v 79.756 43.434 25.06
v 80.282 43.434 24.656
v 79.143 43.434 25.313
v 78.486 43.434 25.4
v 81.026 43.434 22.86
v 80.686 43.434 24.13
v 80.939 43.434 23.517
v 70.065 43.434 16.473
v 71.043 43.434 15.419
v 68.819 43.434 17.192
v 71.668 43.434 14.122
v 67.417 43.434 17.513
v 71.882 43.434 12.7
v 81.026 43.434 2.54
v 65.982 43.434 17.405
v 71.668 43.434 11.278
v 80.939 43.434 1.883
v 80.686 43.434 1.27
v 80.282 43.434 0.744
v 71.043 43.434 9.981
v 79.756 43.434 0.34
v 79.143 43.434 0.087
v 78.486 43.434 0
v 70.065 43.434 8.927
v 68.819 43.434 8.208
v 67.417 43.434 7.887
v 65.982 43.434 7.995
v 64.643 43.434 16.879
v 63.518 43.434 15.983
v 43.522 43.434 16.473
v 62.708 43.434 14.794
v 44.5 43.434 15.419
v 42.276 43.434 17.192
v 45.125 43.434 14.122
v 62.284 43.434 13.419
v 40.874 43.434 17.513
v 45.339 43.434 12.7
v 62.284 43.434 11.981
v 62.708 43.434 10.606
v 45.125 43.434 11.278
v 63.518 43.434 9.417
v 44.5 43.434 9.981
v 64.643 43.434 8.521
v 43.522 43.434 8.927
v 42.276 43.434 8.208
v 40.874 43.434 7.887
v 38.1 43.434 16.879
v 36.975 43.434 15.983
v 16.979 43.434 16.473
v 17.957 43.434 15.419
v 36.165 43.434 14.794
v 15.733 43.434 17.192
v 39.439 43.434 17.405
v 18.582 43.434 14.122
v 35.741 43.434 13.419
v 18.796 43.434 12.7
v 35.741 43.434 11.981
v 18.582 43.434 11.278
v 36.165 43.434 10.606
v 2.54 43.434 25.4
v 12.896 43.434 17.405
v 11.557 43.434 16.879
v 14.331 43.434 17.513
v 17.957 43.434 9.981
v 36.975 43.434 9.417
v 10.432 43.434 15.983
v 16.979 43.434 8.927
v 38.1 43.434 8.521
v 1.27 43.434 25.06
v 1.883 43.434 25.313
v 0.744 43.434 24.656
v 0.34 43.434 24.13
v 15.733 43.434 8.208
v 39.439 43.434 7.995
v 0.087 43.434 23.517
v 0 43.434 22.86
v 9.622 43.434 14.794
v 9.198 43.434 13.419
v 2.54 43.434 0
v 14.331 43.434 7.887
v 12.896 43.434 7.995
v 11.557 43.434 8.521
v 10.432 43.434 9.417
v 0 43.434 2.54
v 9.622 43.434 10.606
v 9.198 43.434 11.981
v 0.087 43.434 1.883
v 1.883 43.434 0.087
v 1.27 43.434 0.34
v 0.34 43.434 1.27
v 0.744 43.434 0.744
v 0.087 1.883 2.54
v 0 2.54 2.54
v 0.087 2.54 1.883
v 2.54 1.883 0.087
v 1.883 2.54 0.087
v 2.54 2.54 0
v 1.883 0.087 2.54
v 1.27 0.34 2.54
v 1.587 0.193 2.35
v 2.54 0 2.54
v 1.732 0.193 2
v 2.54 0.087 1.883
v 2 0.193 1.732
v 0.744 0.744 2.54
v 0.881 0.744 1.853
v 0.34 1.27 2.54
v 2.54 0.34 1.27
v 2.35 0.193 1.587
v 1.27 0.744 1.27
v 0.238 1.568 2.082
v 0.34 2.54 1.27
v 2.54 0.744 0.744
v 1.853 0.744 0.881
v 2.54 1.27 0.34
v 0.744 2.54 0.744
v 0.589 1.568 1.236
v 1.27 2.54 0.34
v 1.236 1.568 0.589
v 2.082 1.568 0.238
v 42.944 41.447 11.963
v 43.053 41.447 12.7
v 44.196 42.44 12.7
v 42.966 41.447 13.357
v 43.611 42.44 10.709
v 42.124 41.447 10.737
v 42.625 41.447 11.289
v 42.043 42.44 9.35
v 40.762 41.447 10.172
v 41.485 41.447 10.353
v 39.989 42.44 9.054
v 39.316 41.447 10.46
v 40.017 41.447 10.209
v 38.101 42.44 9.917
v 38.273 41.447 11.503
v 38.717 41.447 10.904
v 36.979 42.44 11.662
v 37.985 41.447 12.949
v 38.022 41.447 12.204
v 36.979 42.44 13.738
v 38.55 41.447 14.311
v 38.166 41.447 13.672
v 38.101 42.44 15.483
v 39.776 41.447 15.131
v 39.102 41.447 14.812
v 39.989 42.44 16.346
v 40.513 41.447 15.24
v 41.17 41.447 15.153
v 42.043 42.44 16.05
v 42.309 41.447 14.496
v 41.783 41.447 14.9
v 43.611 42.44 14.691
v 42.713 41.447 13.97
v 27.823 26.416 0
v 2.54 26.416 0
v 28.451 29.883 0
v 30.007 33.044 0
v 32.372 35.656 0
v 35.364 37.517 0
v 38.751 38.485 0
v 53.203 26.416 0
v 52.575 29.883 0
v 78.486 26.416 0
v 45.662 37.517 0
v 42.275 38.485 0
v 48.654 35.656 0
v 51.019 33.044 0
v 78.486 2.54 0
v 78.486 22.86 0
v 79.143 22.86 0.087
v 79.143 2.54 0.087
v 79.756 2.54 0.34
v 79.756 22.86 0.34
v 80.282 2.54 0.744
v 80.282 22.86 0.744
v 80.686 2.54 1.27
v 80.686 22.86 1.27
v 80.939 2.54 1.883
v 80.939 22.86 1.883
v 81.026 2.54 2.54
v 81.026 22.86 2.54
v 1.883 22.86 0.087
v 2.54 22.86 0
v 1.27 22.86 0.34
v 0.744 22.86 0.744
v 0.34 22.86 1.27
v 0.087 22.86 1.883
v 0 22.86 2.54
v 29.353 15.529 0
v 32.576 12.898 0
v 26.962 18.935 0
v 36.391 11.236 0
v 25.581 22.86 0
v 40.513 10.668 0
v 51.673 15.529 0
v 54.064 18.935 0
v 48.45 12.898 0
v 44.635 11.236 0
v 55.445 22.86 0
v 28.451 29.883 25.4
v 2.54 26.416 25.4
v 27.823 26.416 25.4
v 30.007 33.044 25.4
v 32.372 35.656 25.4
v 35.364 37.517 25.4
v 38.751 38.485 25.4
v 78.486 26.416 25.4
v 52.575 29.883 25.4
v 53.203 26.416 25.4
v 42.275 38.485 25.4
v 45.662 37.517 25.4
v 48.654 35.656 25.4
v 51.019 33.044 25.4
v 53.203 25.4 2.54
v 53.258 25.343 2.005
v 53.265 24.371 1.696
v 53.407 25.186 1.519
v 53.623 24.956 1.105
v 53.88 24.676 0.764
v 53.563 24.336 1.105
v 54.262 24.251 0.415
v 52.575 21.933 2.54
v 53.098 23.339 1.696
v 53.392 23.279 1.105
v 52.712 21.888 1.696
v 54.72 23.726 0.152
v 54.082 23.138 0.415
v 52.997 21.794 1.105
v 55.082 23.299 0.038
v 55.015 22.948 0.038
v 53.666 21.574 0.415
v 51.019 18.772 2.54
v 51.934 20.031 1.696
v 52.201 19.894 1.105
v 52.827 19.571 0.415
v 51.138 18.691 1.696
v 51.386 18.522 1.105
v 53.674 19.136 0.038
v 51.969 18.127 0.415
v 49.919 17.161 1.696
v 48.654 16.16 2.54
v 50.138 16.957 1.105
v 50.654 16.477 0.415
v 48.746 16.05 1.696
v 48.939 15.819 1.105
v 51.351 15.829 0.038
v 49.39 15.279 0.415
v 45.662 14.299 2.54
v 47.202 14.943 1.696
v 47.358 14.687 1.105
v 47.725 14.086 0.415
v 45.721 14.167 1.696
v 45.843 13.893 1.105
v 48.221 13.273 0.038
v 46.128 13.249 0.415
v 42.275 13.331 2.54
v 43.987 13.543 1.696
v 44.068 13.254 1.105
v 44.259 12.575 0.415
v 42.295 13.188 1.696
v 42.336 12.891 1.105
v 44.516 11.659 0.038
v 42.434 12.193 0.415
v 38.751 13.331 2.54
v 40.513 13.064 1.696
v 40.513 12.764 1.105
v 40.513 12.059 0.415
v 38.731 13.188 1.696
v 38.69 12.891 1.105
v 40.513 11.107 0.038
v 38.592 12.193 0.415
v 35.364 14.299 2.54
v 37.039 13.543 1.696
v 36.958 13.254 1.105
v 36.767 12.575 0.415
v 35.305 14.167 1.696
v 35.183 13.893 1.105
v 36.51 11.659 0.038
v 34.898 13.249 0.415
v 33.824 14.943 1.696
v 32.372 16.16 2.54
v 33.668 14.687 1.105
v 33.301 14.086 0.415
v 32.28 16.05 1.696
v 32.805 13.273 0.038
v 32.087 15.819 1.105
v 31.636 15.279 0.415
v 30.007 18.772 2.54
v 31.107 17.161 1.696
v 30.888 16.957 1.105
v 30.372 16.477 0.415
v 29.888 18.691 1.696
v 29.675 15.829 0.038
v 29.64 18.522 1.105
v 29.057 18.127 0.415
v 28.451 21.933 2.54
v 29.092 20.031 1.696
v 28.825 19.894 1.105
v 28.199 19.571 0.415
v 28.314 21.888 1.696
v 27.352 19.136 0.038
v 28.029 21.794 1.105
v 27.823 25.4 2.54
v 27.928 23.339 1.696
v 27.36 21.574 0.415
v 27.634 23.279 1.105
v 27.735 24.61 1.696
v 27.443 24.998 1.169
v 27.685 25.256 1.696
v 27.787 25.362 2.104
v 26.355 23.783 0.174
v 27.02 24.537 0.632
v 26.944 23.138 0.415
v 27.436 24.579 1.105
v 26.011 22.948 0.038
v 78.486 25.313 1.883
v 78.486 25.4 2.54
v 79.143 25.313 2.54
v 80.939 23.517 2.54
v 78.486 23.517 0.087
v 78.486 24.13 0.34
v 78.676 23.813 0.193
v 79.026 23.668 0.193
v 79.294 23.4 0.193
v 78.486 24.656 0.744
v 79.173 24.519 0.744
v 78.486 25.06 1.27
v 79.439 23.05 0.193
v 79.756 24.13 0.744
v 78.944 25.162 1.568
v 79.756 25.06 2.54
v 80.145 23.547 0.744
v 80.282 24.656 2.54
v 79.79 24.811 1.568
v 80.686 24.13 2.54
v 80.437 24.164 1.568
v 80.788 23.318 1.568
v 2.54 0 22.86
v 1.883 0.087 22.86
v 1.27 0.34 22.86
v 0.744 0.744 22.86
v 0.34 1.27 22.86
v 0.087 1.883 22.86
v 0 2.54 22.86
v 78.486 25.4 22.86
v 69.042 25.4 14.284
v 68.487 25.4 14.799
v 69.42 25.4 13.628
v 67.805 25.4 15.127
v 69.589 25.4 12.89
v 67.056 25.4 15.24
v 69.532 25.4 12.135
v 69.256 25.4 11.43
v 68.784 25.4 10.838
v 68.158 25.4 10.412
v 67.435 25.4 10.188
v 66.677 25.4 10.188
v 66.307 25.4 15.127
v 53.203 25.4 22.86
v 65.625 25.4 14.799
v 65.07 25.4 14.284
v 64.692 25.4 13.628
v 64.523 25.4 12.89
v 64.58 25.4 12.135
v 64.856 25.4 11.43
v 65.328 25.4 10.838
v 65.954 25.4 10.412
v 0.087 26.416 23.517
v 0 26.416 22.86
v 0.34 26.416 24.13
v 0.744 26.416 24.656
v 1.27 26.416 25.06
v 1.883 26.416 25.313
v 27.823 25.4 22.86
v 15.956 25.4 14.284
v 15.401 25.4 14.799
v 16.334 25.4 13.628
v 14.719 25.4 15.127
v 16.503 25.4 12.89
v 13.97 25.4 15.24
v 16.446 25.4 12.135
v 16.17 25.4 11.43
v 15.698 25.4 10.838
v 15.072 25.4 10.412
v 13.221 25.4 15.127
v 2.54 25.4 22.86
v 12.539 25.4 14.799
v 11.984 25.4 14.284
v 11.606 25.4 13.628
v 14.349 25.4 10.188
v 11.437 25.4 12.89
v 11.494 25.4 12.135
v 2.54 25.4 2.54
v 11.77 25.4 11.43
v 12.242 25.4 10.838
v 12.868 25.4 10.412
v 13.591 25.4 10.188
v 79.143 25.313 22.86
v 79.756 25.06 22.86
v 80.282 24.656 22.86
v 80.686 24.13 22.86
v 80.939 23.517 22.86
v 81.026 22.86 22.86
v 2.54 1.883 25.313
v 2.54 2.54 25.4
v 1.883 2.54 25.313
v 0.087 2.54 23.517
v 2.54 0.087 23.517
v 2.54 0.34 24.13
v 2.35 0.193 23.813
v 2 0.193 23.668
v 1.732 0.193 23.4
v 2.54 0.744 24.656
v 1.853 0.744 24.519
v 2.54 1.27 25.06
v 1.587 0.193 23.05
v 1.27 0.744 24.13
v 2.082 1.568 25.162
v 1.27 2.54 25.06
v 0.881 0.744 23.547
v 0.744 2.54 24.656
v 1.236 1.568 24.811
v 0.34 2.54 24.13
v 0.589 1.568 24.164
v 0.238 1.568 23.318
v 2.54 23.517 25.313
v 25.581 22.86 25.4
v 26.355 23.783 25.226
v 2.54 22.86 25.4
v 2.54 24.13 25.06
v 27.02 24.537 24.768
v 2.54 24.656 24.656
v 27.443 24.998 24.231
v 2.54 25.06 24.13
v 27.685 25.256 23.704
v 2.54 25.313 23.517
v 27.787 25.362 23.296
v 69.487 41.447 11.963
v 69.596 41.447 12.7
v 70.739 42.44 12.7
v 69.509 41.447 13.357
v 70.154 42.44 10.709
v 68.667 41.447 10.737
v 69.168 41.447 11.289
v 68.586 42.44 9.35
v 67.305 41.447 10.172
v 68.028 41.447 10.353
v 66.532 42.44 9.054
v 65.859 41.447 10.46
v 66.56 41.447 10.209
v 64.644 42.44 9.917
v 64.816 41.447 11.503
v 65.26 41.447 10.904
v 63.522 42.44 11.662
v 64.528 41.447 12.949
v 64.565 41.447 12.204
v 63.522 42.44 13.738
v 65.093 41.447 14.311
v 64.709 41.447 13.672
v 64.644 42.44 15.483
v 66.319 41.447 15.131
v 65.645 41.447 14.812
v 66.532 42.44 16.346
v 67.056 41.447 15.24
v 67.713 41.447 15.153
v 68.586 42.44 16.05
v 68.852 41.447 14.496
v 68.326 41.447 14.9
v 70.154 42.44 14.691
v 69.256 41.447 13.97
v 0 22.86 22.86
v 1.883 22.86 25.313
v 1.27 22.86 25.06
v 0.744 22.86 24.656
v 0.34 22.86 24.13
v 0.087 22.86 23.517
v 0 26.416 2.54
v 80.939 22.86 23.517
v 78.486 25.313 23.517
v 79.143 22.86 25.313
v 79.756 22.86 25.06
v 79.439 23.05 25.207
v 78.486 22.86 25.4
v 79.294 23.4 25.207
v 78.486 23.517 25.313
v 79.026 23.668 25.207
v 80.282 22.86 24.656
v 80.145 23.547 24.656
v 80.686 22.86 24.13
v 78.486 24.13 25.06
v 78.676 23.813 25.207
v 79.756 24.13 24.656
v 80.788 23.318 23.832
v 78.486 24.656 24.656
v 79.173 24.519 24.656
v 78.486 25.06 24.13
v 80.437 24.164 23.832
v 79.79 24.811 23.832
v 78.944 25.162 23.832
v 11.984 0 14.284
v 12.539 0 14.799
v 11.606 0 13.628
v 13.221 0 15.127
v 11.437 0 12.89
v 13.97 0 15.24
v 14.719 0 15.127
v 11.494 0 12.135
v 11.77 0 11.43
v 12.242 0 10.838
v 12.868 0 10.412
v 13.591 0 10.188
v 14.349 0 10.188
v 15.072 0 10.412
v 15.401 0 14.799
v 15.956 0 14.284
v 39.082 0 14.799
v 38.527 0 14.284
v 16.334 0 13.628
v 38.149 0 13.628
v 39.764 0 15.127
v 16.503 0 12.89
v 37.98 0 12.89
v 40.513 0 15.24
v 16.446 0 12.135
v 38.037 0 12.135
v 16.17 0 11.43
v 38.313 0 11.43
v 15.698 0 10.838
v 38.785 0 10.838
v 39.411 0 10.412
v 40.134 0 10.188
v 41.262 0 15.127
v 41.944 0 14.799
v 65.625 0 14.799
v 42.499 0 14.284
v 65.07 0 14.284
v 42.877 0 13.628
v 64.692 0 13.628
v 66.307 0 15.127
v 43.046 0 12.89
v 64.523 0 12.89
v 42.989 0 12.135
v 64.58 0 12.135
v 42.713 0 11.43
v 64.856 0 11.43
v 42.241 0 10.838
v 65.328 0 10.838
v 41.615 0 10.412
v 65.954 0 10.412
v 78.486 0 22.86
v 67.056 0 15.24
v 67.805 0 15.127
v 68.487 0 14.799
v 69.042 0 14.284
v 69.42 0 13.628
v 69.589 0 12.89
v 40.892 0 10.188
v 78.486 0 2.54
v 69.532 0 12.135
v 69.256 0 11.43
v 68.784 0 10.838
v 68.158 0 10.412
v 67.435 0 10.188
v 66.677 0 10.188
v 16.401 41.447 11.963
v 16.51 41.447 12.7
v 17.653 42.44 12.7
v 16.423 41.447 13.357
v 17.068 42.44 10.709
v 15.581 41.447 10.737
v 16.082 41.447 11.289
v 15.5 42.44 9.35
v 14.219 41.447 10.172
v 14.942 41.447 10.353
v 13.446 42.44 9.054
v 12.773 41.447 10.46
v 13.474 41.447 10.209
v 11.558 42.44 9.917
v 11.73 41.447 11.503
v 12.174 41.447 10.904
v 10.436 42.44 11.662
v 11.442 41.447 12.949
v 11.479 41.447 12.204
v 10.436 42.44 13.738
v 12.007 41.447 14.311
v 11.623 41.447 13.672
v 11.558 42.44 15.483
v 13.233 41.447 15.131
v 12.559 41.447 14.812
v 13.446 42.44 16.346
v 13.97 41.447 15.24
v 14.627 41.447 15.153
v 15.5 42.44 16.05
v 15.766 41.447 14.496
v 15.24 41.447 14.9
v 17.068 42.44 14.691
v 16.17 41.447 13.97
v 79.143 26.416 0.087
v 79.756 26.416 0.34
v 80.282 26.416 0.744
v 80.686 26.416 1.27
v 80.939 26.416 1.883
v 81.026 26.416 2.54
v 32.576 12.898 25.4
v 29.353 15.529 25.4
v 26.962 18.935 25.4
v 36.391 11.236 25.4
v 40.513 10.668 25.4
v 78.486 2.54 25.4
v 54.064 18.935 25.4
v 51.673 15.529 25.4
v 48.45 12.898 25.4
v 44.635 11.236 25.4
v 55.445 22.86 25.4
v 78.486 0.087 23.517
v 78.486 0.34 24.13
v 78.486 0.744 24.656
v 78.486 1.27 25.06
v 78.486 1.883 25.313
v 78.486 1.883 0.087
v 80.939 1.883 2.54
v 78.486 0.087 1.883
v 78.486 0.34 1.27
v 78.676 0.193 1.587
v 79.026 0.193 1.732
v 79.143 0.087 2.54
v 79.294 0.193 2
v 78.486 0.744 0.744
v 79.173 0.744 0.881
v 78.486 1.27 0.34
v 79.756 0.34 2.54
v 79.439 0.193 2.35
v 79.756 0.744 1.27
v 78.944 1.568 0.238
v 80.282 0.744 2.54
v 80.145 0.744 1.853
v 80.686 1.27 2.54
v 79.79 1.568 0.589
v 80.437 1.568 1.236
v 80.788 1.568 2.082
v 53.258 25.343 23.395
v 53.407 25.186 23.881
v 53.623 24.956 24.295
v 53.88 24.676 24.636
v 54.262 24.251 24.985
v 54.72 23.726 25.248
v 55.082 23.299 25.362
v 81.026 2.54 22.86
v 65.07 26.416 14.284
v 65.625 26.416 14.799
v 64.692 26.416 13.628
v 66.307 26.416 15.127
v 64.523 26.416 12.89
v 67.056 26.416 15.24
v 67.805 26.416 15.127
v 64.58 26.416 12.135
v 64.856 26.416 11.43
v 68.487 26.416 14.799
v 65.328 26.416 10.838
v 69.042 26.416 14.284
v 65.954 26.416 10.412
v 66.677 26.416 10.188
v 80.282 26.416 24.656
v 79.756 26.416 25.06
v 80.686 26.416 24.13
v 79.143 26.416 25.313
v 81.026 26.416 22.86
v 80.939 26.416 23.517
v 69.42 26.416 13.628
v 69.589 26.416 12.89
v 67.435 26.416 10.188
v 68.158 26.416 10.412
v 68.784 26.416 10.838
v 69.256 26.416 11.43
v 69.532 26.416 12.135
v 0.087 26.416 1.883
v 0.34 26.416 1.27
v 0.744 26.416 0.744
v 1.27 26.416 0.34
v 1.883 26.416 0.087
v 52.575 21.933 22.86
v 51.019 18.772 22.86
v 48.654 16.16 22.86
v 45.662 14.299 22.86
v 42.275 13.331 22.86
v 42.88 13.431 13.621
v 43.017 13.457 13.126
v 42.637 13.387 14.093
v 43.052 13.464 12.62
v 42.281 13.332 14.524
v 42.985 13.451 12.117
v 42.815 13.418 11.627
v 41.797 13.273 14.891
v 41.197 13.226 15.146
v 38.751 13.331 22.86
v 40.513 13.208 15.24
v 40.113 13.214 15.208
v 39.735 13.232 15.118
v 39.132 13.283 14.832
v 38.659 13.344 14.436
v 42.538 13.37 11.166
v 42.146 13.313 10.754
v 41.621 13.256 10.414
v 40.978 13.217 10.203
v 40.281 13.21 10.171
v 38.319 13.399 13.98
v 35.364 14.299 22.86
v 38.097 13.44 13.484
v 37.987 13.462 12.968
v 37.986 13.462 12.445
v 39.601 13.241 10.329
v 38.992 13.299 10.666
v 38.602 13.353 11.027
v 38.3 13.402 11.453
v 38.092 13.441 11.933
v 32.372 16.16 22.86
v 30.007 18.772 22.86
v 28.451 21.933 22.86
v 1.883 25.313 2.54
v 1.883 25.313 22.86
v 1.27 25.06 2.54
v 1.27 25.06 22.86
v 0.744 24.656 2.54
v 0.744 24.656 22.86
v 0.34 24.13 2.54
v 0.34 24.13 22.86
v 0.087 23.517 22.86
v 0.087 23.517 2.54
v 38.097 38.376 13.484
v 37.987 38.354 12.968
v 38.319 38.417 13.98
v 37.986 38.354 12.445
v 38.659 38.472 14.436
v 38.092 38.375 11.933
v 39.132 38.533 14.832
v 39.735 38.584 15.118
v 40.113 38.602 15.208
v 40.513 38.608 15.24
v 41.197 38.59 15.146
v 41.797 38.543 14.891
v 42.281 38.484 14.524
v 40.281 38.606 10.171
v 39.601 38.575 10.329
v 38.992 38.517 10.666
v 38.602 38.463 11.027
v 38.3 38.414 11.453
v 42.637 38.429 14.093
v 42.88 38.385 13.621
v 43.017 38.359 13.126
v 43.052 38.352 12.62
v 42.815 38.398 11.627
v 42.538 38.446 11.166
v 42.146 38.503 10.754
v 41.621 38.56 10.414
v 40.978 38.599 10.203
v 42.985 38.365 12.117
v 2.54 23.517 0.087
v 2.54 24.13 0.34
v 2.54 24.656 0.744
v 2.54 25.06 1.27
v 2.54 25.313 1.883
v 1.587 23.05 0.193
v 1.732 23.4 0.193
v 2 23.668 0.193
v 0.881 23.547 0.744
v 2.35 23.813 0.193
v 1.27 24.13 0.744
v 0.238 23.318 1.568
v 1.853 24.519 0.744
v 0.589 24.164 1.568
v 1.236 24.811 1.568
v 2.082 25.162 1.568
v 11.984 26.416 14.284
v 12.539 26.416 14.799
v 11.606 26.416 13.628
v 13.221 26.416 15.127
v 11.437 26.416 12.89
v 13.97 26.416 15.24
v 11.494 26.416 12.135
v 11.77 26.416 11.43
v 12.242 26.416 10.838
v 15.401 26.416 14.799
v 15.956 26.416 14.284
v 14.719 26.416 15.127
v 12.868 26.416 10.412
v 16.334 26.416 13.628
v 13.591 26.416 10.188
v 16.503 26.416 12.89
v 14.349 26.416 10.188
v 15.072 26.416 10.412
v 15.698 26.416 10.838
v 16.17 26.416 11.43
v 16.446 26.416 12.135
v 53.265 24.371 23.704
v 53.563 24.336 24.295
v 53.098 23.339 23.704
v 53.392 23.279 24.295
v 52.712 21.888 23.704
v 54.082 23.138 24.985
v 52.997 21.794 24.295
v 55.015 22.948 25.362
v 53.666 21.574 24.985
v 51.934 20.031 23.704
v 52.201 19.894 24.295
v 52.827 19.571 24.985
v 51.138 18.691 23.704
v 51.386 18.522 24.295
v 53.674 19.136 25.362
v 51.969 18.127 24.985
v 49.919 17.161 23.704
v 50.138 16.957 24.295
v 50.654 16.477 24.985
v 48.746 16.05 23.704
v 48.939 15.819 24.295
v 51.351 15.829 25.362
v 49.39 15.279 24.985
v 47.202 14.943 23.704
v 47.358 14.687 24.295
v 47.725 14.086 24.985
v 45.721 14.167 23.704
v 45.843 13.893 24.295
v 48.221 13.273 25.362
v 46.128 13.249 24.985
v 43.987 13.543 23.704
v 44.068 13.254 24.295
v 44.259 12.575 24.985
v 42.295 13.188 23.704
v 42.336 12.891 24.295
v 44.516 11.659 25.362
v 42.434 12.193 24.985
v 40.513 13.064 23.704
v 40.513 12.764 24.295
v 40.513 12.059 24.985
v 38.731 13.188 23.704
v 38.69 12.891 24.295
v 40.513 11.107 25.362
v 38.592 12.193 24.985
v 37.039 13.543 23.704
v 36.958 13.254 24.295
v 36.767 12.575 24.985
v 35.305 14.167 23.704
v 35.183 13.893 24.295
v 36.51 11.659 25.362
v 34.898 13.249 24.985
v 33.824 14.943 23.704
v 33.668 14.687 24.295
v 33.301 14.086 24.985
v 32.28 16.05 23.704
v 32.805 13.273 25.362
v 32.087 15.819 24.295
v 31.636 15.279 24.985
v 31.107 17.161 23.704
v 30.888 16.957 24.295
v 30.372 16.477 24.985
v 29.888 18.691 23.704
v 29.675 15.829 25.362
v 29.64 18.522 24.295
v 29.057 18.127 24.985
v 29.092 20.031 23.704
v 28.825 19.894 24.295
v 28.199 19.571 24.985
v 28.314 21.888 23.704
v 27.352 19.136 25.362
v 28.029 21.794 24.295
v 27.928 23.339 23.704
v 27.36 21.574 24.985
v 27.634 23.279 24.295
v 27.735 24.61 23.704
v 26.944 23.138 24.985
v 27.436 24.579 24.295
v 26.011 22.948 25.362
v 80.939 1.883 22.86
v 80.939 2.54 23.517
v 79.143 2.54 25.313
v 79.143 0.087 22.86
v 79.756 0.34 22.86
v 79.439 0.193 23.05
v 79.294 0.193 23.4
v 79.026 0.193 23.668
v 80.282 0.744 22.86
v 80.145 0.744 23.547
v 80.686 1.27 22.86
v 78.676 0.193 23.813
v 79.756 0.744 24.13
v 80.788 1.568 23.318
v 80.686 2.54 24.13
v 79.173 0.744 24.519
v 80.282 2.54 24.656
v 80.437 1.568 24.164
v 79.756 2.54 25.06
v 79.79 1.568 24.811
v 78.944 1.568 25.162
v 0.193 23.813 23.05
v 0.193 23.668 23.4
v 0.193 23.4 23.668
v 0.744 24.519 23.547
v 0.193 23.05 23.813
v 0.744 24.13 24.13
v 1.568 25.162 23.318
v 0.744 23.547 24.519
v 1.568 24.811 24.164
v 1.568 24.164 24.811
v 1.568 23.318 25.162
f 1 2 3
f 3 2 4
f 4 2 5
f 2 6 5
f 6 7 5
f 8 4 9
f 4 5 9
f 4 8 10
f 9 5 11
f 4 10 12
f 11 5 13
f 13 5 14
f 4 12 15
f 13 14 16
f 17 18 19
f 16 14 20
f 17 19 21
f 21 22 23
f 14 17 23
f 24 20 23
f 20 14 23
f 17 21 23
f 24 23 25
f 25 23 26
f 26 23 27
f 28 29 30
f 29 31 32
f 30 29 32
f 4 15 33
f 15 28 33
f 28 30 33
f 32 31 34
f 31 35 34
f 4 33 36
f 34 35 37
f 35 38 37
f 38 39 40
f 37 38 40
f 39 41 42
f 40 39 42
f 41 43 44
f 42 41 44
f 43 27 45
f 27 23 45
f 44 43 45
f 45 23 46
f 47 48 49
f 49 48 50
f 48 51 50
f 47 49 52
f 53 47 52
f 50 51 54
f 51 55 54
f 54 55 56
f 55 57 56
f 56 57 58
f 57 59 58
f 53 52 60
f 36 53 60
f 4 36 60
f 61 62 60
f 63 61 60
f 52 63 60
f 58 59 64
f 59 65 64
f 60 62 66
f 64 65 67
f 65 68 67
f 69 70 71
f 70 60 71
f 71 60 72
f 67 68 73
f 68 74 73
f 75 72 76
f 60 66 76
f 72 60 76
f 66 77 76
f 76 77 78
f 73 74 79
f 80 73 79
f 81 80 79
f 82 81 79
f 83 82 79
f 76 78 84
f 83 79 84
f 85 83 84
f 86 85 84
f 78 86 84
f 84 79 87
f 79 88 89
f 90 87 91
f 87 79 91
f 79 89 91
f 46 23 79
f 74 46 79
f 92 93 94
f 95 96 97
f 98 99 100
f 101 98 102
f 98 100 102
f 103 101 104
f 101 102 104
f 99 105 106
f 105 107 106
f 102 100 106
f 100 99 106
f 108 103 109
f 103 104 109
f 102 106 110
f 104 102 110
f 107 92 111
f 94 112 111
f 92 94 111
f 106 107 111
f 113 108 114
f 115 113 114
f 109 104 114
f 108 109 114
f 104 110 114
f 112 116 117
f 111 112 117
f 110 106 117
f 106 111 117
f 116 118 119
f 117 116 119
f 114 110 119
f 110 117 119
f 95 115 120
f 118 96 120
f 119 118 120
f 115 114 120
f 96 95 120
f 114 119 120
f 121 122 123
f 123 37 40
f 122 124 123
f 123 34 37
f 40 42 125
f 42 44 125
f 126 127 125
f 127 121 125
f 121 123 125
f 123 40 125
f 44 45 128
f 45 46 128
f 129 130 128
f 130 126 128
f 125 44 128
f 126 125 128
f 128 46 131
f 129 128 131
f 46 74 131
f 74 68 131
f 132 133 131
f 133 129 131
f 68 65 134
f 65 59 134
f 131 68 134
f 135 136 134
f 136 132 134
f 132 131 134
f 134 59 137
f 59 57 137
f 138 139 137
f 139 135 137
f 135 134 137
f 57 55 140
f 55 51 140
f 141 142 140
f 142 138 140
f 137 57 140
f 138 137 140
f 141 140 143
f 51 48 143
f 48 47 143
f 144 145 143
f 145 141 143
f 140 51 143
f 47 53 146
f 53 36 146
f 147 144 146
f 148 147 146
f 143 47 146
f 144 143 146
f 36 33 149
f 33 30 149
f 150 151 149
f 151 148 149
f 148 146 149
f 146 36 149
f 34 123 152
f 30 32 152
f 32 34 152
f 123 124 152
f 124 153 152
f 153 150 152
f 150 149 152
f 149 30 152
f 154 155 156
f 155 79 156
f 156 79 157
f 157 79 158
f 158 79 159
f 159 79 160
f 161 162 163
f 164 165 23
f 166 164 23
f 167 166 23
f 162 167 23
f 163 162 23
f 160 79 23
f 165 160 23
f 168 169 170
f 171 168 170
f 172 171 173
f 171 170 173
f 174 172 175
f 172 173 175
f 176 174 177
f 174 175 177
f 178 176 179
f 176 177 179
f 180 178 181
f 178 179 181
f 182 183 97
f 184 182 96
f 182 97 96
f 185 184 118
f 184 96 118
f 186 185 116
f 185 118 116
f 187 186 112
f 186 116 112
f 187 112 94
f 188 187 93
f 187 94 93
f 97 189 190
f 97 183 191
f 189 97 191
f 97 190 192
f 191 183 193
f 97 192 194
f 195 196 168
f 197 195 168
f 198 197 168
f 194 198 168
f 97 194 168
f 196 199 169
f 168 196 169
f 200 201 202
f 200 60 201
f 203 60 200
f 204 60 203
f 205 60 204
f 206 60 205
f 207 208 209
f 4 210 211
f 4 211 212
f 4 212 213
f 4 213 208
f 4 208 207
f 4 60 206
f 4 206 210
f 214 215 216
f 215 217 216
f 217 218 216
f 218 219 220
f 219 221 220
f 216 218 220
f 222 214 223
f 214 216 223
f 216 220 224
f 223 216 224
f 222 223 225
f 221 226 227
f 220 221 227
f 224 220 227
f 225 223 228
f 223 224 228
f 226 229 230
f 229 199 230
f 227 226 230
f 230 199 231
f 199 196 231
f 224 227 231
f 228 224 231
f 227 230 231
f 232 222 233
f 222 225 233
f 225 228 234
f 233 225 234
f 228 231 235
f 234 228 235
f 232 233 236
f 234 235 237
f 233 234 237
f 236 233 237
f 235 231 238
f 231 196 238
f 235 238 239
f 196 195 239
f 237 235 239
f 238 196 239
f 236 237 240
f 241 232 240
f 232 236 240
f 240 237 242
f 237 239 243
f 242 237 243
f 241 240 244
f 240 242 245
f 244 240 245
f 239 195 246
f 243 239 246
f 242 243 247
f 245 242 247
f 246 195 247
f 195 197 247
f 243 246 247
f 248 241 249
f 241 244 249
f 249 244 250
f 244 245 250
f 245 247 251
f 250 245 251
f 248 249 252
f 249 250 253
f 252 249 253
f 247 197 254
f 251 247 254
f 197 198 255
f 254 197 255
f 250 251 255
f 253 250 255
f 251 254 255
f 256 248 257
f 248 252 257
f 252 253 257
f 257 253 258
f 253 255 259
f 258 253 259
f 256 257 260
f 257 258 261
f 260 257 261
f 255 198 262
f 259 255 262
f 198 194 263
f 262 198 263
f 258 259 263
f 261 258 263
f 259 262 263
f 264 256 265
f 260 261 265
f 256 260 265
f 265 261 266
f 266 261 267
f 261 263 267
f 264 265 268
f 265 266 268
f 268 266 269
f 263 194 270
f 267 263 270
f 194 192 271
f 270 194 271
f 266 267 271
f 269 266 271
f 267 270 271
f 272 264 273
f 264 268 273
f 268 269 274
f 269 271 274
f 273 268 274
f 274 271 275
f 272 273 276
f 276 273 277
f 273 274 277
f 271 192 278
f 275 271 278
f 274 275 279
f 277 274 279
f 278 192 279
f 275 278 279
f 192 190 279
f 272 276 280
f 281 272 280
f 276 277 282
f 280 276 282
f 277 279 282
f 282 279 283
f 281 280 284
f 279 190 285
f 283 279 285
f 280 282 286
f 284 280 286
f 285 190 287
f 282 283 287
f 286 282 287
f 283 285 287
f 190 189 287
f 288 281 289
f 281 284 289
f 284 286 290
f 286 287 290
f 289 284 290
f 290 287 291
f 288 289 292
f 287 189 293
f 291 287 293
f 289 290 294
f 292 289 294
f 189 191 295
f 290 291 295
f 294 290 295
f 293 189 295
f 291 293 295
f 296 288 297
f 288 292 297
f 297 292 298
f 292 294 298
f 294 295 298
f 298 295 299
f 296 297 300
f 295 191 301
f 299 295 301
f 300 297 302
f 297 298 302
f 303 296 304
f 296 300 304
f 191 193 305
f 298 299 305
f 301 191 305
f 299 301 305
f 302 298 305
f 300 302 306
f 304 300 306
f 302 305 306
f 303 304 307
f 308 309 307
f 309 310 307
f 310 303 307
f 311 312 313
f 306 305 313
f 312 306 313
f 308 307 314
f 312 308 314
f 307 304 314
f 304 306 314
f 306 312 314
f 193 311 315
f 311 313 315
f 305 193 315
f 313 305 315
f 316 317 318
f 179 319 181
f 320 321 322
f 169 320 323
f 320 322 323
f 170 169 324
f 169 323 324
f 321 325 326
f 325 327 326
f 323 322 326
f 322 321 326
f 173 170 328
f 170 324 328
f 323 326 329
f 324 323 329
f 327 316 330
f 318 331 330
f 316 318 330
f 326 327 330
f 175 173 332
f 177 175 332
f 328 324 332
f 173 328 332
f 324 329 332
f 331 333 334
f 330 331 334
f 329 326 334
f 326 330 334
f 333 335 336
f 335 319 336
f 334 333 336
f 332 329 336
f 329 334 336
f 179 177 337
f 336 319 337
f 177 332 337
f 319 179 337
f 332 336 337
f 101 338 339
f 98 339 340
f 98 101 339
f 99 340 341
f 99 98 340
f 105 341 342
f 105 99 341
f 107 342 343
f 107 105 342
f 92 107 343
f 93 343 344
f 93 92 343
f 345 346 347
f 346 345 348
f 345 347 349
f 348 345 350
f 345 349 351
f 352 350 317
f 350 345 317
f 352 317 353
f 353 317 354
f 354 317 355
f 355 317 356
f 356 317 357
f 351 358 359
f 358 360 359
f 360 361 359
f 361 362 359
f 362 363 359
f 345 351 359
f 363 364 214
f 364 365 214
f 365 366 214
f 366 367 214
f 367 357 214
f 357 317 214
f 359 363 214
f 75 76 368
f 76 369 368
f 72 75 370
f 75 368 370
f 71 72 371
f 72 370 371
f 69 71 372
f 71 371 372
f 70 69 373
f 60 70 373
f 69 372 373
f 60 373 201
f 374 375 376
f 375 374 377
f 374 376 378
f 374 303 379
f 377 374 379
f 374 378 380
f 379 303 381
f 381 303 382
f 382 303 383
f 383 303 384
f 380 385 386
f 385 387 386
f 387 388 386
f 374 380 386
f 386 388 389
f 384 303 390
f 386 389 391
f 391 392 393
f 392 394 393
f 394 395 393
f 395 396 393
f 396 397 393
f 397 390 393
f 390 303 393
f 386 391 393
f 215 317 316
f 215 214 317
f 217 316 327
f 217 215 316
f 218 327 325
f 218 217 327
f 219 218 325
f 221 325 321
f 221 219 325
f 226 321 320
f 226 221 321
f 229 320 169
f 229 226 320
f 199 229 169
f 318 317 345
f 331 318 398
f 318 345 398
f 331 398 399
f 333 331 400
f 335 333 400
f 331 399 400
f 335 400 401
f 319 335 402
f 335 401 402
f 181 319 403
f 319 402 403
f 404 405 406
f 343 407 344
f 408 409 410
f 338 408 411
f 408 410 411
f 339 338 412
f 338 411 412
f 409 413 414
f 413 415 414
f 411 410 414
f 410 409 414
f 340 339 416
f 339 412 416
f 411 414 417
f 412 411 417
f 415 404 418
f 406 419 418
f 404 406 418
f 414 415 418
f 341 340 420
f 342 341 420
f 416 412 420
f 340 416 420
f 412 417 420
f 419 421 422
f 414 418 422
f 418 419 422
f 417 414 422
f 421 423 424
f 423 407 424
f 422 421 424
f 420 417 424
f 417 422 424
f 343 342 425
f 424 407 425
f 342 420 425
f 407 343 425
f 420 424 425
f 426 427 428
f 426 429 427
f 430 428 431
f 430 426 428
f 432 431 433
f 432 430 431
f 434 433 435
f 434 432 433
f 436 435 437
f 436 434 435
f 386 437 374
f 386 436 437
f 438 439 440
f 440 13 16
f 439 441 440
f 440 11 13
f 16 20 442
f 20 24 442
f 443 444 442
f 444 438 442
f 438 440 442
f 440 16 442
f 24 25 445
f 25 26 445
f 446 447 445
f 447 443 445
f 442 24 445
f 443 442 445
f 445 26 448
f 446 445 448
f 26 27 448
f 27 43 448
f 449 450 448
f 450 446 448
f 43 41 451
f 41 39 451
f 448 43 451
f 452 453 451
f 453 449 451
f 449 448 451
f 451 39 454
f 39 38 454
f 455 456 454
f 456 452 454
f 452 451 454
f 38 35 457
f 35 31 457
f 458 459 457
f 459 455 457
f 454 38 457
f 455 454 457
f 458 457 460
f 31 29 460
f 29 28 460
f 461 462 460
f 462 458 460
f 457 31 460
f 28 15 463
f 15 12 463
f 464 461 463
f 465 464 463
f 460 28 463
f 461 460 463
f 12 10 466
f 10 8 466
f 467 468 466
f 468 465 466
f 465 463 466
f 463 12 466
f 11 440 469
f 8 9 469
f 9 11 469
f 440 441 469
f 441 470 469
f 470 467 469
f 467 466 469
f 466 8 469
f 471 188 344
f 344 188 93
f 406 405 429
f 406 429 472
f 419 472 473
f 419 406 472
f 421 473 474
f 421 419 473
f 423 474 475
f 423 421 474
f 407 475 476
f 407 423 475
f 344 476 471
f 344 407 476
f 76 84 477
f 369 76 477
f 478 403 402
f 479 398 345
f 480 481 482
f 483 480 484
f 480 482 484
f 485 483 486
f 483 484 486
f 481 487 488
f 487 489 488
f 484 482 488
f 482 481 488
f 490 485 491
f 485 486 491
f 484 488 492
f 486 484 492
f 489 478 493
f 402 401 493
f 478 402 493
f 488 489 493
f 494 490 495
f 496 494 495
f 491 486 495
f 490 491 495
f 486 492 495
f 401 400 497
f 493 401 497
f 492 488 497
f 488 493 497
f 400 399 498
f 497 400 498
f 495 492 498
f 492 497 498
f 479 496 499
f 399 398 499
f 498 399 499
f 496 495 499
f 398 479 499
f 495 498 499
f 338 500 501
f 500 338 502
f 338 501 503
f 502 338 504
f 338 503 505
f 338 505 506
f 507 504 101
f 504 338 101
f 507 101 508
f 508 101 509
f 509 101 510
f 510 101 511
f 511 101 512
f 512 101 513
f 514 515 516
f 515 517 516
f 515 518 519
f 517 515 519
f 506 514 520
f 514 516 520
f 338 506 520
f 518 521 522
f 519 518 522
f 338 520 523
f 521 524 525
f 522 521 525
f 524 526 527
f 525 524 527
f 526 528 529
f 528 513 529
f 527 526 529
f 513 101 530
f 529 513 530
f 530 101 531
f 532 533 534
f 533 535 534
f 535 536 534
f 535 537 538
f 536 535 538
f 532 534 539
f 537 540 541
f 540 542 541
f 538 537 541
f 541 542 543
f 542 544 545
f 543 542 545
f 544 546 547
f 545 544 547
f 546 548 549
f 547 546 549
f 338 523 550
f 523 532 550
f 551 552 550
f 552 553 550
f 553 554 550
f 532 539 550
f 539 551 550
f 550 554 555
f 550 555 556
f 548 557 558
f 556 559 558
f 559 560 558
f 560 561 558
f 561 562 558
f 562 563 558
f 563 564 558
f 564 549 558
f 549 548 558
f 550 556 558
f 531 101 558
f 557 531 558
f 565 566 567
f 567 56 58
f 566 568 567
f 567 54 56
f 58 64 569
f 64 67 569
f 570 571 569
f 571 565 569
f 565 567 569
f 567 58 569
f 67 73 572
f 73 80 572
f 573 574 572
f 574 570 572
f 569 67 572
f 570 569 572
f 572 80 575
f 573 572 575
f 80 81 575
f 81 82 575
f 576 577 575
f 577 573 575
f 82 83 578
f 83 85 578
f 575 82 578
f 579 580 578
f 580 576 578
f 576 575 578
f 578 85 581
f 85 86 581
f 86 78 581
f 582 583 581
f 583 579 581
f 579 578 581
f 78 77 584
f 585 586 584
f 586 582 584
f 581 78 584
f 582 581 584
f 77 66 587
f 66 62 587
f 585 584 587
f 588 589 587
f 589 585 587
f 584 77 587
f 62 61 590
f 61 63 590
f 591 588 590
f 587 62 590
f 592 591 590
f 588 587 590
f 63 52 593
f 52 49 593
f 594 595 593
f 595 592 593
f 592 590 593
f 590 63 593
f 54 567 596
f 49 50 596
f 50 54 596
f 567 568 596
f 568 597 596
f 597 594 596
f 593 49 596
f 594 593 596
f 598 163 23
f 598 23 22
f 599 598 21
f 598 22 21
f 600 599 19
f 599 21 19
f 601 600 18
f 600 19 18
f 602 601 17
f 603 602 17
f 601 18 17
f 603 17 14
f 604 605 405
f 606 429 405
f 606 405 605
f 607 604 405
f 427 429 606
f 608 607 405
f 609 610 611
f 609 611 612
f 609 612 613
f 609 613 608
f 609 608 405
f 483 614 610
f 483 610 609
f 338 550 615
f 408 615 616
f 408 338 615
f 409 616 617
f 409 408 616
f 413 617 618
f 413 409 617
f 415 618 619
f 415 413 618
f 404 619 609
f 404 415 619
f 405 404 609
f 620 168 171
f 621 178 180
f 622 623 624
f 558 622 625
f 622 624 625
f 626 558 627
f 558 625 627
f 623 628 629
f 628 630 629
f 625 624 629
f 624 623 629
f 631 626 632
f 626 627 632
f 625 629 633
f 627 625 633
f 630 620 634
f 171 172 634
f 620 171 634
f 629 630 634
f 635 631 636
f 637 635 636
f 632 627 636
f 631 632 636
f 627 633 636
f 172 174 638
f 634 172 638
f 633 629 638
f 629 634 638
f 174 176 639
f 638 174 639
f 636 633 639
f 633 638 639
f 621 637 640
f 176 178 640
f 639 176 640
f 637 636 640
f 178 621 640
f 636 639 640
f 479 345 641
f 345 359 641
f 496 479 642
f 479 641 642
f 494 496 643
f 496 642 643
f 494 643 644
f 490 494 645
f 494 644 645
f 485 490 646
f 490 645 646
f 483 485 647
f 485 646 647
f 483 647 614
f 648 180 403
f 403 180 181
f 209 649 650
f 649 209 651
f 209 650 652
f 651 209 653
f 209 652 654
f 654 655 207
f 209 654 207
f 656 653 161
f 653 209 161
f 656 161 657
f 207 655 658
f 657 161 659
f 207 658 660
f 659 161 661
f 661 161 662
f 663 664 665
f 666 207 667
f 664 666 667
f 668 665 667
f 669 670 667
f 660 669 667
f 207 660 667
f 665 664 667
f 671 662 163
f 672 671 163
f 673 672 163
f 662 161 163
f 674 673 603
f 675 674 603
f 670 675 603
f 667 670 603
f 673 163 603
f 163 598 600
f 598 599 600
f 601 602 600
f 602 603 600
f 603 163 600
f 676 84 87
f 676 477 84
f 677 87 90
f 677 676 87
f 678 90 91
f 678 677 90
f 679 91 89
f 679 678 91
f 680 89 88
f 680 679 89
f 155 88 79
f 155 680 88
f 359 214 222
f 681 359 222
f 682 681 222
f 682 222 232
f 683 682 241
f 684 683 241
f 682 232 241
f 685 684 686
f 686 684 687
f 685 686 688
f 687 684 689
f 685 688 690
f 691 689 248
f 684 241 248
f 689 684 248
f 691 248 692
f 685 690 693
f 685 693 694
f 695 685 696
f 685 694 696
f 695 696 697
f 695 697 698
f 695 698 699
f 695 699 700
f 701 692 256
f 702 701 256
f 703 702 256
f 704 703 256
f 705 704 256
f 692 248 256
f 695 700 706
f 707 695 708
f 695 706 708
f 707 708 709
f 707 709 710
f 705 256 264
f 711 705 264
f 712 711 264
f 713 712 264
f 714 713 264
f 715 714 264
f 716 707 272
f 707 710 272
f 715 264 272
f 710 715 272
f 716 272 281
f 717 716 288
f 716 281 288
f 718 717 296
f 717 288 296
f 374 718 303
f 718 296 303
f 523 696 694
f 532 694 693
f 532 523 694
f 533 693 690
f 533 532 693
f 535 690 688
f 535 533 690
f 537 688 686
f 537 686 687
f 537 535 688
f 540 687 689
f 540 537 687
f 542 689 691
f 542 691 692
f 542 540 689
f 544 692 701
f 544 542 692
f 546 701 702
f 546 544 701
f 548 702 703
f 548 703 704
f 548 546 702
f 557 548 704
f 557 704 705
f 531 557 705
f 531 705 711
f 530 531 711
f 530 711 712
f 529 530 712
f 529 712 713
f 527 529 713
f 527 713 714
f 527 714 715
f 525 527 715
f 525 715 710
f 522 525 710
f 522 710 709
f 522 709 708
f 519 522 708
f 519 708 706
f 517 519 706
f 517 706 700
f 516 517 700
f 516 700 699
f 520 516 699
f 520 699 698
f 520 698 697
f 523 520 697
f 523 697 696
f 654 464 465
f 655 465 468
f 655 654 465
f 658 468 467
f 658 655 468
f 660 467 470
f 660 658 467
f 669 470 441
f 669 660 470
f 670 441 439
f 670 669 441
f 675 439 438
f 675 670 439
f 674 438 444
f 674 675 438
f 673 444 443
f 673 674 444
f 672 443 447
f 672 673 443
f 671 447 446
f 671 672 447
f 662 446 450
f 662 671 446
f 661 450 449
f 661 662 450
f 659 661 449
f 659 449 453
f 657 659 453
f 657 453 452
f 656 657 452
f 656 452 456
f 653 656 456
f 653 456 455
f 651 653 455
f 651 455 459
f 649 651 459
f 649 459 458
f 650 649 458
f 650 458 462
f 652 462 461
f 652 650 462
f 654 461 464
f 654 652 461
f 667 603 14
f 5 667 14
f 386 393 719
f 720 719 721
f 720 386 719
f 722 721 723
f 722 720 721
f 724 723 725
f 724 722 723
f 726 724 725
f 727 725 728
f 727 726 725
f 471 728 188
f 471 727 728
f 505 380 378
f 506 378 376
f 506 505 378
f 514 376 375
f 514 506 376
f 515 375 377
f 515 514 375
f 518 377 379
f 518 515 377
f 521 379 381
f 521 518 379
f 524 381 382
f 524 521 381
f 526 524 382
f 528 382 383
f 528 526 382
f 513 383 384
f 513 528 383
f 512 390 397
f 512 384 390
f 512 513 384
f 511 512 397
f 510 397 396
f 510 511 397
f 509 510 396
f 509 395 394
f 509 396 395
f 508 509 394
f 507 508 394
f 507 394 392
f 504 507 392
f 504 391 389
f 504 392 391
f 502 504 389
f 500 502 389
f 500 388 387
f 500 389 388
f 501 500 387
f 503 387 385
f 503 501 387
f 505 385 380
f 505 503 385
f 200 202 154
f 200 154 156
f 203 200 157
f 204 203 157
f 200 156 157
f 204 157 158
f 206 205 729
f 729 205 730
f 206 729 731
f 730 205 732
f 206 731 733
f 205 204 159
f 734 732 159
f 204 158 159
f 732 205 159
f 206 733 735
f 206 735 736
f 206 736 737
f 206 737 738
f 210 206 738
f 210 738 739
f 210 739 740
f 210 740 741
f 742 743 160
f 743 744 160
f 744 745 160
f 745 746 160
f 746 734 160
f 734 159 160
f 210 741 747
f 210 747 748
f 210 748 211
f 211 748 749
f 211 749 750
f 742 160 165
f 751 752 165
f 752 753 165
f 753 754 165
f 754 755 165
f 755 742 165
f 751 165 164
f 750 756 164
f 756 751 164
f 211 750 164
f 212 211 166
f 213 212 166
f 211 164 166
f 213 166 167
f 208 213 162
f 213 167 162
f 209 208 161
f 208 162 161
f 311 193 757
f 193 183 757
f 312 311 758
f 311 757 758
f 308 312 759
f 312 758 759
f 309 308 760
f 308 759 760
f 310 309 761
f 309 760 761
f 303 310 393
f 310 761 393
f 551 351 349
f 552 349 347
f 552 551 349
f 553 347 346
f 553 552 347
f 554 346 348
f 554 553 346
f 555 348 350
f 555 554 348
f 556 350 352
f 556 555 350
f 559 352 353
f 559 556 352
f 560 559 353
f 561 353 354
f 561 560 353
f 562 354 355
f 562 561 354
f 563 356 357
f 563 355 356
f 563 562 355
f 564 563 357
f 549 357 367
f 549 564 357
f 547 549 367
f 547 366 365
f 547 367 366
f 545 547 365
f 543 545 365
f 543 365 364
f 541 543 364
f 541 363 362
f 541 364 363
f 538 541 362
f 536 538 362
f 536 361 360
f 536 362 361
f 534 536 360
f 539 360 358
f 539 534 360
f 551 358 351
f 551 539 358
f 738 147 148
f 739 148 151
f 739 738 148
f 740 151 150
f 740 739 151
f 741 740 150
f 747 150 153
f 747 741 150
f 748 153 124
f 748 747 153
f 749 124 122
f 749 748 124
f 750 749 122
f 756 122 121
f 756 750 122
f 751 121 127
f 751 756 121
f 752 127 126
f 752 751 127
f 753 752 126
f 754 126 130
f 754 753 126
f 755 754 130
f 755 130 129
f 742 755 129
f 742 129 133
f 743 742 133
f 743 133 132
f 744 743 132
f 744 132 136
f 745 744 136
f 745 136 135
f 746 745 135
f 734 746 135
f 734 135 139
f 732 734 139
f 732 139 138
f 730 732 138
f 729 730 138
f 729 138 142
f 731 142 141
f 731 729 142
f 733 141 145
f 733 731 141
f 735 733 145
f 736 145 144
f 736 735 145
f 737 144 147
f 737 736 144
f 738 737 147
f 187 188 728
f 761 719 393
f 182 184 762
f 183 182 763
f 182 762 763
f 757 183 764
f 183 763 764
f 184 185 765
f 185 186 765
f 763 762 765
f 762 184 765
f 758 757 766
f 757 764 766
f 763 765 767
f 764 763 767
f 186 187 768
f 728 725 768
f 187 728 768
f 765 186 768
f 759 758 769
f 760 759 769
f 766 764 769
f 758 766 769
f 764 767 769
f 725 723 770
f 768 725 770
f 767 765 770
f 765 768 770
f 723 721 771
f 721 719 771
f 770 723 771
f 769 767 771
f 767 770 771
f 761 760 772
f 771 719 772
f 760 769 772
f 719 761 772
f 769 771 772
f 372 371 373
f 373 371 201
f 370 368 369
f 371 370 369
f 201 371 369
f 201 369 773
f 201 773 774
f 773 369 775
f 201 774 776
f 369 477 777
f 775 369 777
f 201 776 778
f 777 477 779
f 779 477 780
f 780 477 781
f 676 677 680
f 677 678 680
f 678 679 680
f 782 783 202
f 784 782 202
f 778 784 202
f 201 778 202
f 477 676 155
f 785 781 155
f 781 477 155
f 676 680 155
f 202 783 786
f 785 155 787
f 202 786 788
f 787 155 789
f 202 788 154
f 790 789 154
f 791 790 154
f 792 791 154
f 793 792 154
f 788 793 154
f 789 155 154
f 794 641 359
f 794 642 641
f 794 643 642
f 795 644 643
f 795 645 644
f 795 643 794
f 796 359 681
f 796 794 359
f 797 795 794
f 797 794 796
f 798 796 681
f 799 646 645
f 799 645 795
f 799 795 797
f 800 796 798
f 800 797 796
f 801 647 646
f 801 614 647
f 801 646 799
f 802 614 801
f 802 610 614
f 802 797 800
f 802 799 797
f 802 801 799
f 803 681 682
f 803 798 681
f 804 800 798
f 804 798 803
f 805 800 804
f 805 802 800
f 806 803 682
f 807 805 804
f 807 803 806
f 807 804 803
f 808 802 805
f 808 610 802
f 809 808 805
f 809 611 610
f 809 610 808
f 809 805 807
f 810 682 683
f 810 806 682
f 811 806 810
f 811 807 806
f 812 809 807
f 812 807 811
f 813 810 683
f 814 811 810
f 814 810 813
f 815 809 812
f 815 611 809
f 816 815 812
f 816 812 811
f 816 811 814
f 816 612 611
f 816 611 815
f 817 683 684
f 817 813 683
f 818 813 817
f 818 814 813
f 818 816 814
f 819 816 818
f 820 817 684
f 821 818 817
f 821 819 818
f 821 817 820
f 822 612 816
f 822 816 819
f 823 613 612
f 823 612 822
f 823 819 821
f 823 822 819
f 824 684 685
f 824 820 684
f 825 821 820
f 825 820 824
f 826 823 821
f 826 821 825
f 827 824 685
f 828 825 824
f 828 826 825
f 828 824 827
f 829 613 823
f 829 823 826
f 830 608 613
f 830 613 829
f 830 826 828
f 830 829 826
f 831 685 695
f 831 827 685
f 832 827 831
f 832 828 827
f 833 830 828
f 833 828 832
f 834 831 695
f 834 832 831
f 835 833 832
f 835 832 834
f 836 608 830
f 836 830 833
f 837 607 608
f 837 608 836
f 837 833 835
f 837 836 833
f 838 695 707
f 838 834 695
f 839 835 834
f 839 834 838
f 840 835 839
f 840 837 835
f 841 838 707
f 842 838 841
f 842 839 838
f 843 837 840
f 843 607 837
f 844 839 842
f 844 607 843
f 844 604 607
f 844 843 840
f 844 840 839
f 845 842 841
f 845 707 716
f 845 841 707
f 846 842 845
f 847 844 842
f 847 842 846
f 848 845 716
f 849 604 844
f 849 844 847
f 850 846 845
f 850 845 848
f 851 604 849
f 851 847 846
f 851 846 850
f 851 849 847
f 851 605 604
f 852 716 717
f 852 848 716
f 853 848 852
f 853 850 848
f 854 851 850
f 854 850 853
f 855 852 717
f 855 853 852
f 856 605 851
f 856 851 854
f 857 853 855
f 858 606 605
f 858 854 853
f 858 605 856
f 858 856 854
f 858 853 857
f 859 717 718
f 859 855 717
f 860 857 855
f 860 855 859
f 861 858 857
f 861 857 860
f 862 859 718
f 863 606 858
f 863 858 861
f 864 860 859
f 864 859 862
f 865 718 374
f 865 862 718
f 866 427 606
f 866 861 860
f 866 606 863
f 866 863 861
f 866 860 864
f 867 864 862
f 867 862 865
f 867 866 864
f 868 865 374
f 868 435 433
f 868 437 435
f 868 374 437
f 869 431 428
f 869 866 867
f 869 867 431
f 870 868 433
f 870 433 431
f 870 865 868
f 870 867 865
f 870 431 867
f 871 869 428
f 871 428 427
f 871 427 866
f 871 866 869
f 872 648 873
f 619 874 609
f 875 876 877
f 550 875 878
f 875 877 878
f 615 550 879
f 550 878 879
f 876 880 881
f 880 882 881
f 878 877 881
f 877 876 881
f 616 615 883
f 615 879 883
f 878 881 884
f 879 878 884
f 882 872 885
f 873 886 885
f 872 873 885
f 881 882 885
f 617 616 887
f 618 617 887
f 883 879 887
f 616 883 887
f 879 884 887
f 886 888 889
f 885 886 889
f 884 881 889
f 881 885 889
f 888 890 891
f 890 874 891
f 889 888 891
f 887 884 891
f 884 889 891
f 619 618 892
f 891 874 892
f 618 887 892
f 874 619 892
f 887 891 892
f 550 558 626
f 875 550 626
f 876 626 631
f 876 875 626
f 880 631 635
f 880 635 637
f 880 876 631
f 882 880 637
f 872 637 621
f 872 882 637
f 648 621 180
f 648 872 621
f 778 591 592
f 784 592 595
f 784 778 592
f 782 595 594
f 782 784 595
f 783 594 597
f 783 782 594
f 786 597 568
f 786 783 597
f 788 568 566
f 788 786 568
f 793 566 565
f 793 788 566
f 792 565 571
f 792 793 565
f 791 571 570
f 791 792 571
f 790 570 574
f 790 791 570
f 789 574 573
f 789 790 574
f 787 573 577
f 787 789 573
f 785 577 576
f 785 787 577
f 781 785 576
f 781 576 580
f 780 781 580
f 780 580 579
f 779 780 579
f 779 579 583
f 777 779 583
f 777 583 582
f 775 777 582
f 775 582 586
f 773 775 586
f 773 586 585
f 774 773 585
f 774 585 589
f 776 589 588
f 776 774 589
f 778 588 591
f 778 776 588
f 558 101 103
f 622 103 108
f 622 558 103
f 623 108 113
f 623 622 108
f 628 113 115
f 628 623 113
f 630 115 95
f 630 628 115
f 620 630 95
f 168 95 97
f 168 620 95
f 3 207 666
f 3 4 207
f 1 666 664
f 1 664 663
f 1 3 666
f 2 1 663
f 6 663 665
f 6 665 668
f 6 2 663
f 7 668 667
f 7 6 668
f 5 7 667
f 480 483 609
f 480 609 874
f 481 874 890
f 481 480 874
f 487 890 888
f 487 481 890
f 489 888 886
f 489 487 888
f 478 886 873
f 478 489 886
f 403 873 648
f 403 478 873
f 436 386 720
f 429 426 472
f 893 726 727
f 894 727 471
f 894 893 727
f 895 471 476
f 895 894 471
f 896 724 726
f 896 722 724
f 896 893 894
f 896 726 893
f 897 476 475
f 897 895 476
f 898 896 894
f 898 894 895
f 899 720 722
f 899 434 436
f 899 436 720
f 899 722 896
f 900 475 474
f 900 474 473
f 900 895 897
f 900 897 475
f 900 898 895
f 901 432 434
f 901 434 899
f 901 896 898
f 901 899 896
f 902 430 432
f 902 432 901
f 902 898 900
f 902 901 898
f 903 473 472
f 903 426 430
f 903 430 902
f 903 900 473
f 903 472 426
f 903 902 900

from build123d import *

# Parameters (mm, degrees)
BOSS_EXTRUDE1_DEPTH          = 25.4
BOSS_EXTRUDE1_2_DEPTH        = 25.4
CUT_EXTRUDE1_START           = -43.434
SKETCH3_R                    = 2.54
CUT_EXTRUDE1_DEPTH           = 43.434
SKETCH3_3_R                  = 4.826
CUT_EXTRUDE2_DEPTH           = 3.2258
CUT_EXTRUDE2_DRAFT           = -49
CUT_EXTRUDE2_PROFILE_2_DEPTH = 3.2258
CUT_EXTRUDE2_PROFILE_2_DRAFT = -49
CUT_EXTRUDE2_PROFILE_3_DEPTH = 3.2258
CUT_EXTRUDE2_PROFILE_3_DRAFT = -49
FILLET1_R                    = 2.54
FILLET2_R                    = 2.54
FILLET3_R                    = 2.54


with BuildPart() as part:
    # Sketch2 → Boss-Extrude1 (new body)
    with BuildSketch(Plane.XY):
        with BuildLine():
            Line((0, 43.434), (0, 26.416))
            Line((0, 26.416), (27.823164067, 26.416))
            ThreePointArc((27.823164067, 26.416), (40.513, 38.608), (53.202835933, 26.416))
            Line((53.202835933, 26.416), (81.026, 26.416))
            Line((81.026, 26.416), (81.026, 43.434))
            Line((81.026, 43.434), (0, 43.434))
        make_face()
    extrude(amount=BOSS_EXTRUDE1_DEPTH)


with BuildPart() as body_2:
    # Sketch2 → Boss-Extrude1 2 (new body)
    with BuildSketch(Plane.XY):
        with BuildLine():
            ThreePointArc((53.202835933, 25.4), (40.513, 13.208), (27.823164067, 25.4))
            Line((27.823164067, 25.4), (0, 25.4))
            Line((0, 25.4), (0, 0))
            Line((0, 0), (81.026, 0))
            Line((81.026, 0), (81.026, 25.4))
            Line((81.026, 25.4), (53.202835933, 25.4))
        make_face()
    extrude(amount=BOSS_EXTRUDE1_2_DEPTH)


with BuildPart() as cut_extrude1_tool:
    # Sketch3 → Cut-Extrude1 (new body)
    with BuildSketch(Plane(origin=(0, 43.434, 0), x_dir=(1, 0, 0), z_dir=(0, 1, 0)).offset(CUT_EXTRUDE1_START)):
        with Locations(Location((13.97, -12.7, 0), (0, 0, 270))):
            Circle(SKETCH3_R)
        with Locations(Location((40.513, -12.7, 0), (0, 0, 270))):
            Circle(SKETCH3_R)
        with Locations(Location((67.056, -12.7, 0), (0, 0, 270))):
            Circle(SKETCH3_R)
    extrude(amount=CUT_EXTRUDE1_DEPTH)


with BuildPart() as part_1:
    add(part.part)

    # Cut-Extrude1: cut by cut_extrude1_tool
    add(cut_extrude1_tool.part, mode=Mode.SUBTRACT)


with BuildPart() as body_2_1:
    add(body_2.part)

    # Cut-Extrude1: cut by cut_extrude1_tool
    add(cut_extrude1_tool.part, mode=Mode.SUBTRACT)

    # Fillet1
    fillet1_edges = [body_2_1.edges().sort_by_distance(p)[0] for p in [
        (13.911582034, 25.4, 25.4),
        (81.026, 25.4, 12.7),
        (0, 25.4, 12.7),
        (0, 12.7, 25.4),
        (81.026, 12.7, 25.4),
        (67.114417966, 25.4, 25.4),
        (40.513, 13.208, 25.4),
        (67.114417966, 25.4, 0),
        (81.026, 12.7, 0),
        (0, 12.7, 0),
        (13.911582034, 25.4, 0),
        (40.513, 13.208, 0),
    ]]
    fillet(fillet1_edges, radius=FILLET1_R)

    # Fillet3
    fillet3_edges = [body_2_1.edges().sort_by_distance(p)[0] for p in [
        (81.026, 0, 12.7),
        (40.513, 0, 0),
        (40.513, 0, 25.4),
        (0, 0, 12.7),
        (80.282051224, 0, 24.656051224),
        (0.743948776, 0, 24.656051224),
        (0.743948776, 0, 0.743948776),
        (80.282051224, 0, 0.743948776),
    ]]
    fillet(fillet3_edges, radius=FILLET3_R)


with BuildPart() as cut_extrude2_tool:
    # Sketch3<3> → Cut-Extrude2 (with draft: the straight prism first)
    with BuildSketch(Plane(origin=(0, 43.434, 0), x_dir=(1, 0, 0), z_dir=(0, 1, 0))):
        with Locations((40.513, -12.7)):
            Circle(SKETCH3_3_R)
    extrude(amount=-CUT_EXTRUDE2_DEPTH)
    # Cut-Extrude2: the draft: its side faces are tilted about the plane it starts from
    cut_extrude2_sides = [cut_extrude2_tool.faces().sort_by_distance(p)[0] for p in [
        (35.687, 41.8211, 12.7),
    ]]
    draft(cut_extrude2_sides, Plane(origin=(0, 43.434, 0), x_dir=(1, 0, 0), z_dir=(0, 1, 0)), CUT_EXTRUDE2_DRAFT)


with BuildPart() as part_2:
    add(part_1.part)

    # Cut-Extrude2: cut by cut_extrude2_tool
    add(cut_extrude2_tool.part, mode=Mode.SUBTRACT)


with BuildPart() as cut_extrude2_profile_2_tool:
    # Sketch3<3> → Cut-Extrude2 profile 2 (with draft: the straight prism first)
    with BuildSketch(Plane(origin=(0, 43.434, 0), x_dir=(1, 0, 0), z_dir=(0, 1, 0))):
        with Locations((13.97, -12.7)):
            Circle(SKETCH3_3_R)
    extrude(amount=-CUT_EXTRUDE2_PROFILE_2_DEPTH)
    # Cut-Extrude2 profile 2: the draft: its side faces are tilted about the plane it starts from
    cut_extrude2_profile_2_sides = [cut_extrude2_profile_2_tool.faces().sort_by_distance(p)[0] for p in [
        (9.144, 41.8211, 12.7),
    ]]
    draft(cut_extrude2_profile_2_sides, Plane(origin=(0, 43.434, 0), x_dir=(1, 0, 0), z_dir=(0, 1, 0)), CUT_EXTRUDE2_PROFILE_2_DRAFT)


with BuildPart() as part_3:
    add(part_2.part)

    # Cut-Extrude2 profile 2: cut by cut_extrude2_profile_2_tool
    add(cut_extrude2_profile_2_tool.part, mode=Mode.SUBTRACT)


with BuildPart() as cut_extrude2_profile_3_tool:
    # Sketch3<3> → Cut-Extrude2 profile 3 (with draft: the straight prism first)
    with BuildSketch(Plane(origin=(0, 43.434, 0), x_dir=(1, 0, 0), z_dir=(0, 1, 0))):
        with Locations((67.056, -12.7)):
            Circle(SKETCH3_3_R)
    extrude(amount=-CUT_EXTRUDE2_PROFILE_3_DEPTH)
    # Cut-Extrude2 profile 3: the draft: its side faces are tilted about the plane it starts from
    cut_extrude2_profile_3_sides = [cut_extrude2_profile_3_tool.faces().sort_by_distance(p)[0] for p in [
        (62.23, 41.8211, 12.7),
    ]]
    draft(cut_extrude2_profile_3_sides, Plane(origin=(0, 43.434, 0), x_dir=(1, 0, 0), z_dir=(0, 1, 0)), CUT_EXTRUDE2_PROFILE_3_DRAFT)


with BuildPart() as part_4:
    add(part_3.part)

    # Cut-Extrude2 profile 3: cut by cut_extrude2_profile_3_tool
    add(cut_extrude2_profile_3_tool.part, mode=Mode.SUBTRACT)

    # Fillet2
    fillet2_edges = [part_4.edges().sort_by_distance(p)[0] for p in [
        (81.026, 34.925, 25.4),
        (0, 34.925, 25.4),
        (0, 34.925, 0),
        (81.026, 34.925, 0),
    ]]
    fillet(fillet2_edges, radius=FILLET2_R)


solid = Compound([body_2_1.part, part_4.part])
